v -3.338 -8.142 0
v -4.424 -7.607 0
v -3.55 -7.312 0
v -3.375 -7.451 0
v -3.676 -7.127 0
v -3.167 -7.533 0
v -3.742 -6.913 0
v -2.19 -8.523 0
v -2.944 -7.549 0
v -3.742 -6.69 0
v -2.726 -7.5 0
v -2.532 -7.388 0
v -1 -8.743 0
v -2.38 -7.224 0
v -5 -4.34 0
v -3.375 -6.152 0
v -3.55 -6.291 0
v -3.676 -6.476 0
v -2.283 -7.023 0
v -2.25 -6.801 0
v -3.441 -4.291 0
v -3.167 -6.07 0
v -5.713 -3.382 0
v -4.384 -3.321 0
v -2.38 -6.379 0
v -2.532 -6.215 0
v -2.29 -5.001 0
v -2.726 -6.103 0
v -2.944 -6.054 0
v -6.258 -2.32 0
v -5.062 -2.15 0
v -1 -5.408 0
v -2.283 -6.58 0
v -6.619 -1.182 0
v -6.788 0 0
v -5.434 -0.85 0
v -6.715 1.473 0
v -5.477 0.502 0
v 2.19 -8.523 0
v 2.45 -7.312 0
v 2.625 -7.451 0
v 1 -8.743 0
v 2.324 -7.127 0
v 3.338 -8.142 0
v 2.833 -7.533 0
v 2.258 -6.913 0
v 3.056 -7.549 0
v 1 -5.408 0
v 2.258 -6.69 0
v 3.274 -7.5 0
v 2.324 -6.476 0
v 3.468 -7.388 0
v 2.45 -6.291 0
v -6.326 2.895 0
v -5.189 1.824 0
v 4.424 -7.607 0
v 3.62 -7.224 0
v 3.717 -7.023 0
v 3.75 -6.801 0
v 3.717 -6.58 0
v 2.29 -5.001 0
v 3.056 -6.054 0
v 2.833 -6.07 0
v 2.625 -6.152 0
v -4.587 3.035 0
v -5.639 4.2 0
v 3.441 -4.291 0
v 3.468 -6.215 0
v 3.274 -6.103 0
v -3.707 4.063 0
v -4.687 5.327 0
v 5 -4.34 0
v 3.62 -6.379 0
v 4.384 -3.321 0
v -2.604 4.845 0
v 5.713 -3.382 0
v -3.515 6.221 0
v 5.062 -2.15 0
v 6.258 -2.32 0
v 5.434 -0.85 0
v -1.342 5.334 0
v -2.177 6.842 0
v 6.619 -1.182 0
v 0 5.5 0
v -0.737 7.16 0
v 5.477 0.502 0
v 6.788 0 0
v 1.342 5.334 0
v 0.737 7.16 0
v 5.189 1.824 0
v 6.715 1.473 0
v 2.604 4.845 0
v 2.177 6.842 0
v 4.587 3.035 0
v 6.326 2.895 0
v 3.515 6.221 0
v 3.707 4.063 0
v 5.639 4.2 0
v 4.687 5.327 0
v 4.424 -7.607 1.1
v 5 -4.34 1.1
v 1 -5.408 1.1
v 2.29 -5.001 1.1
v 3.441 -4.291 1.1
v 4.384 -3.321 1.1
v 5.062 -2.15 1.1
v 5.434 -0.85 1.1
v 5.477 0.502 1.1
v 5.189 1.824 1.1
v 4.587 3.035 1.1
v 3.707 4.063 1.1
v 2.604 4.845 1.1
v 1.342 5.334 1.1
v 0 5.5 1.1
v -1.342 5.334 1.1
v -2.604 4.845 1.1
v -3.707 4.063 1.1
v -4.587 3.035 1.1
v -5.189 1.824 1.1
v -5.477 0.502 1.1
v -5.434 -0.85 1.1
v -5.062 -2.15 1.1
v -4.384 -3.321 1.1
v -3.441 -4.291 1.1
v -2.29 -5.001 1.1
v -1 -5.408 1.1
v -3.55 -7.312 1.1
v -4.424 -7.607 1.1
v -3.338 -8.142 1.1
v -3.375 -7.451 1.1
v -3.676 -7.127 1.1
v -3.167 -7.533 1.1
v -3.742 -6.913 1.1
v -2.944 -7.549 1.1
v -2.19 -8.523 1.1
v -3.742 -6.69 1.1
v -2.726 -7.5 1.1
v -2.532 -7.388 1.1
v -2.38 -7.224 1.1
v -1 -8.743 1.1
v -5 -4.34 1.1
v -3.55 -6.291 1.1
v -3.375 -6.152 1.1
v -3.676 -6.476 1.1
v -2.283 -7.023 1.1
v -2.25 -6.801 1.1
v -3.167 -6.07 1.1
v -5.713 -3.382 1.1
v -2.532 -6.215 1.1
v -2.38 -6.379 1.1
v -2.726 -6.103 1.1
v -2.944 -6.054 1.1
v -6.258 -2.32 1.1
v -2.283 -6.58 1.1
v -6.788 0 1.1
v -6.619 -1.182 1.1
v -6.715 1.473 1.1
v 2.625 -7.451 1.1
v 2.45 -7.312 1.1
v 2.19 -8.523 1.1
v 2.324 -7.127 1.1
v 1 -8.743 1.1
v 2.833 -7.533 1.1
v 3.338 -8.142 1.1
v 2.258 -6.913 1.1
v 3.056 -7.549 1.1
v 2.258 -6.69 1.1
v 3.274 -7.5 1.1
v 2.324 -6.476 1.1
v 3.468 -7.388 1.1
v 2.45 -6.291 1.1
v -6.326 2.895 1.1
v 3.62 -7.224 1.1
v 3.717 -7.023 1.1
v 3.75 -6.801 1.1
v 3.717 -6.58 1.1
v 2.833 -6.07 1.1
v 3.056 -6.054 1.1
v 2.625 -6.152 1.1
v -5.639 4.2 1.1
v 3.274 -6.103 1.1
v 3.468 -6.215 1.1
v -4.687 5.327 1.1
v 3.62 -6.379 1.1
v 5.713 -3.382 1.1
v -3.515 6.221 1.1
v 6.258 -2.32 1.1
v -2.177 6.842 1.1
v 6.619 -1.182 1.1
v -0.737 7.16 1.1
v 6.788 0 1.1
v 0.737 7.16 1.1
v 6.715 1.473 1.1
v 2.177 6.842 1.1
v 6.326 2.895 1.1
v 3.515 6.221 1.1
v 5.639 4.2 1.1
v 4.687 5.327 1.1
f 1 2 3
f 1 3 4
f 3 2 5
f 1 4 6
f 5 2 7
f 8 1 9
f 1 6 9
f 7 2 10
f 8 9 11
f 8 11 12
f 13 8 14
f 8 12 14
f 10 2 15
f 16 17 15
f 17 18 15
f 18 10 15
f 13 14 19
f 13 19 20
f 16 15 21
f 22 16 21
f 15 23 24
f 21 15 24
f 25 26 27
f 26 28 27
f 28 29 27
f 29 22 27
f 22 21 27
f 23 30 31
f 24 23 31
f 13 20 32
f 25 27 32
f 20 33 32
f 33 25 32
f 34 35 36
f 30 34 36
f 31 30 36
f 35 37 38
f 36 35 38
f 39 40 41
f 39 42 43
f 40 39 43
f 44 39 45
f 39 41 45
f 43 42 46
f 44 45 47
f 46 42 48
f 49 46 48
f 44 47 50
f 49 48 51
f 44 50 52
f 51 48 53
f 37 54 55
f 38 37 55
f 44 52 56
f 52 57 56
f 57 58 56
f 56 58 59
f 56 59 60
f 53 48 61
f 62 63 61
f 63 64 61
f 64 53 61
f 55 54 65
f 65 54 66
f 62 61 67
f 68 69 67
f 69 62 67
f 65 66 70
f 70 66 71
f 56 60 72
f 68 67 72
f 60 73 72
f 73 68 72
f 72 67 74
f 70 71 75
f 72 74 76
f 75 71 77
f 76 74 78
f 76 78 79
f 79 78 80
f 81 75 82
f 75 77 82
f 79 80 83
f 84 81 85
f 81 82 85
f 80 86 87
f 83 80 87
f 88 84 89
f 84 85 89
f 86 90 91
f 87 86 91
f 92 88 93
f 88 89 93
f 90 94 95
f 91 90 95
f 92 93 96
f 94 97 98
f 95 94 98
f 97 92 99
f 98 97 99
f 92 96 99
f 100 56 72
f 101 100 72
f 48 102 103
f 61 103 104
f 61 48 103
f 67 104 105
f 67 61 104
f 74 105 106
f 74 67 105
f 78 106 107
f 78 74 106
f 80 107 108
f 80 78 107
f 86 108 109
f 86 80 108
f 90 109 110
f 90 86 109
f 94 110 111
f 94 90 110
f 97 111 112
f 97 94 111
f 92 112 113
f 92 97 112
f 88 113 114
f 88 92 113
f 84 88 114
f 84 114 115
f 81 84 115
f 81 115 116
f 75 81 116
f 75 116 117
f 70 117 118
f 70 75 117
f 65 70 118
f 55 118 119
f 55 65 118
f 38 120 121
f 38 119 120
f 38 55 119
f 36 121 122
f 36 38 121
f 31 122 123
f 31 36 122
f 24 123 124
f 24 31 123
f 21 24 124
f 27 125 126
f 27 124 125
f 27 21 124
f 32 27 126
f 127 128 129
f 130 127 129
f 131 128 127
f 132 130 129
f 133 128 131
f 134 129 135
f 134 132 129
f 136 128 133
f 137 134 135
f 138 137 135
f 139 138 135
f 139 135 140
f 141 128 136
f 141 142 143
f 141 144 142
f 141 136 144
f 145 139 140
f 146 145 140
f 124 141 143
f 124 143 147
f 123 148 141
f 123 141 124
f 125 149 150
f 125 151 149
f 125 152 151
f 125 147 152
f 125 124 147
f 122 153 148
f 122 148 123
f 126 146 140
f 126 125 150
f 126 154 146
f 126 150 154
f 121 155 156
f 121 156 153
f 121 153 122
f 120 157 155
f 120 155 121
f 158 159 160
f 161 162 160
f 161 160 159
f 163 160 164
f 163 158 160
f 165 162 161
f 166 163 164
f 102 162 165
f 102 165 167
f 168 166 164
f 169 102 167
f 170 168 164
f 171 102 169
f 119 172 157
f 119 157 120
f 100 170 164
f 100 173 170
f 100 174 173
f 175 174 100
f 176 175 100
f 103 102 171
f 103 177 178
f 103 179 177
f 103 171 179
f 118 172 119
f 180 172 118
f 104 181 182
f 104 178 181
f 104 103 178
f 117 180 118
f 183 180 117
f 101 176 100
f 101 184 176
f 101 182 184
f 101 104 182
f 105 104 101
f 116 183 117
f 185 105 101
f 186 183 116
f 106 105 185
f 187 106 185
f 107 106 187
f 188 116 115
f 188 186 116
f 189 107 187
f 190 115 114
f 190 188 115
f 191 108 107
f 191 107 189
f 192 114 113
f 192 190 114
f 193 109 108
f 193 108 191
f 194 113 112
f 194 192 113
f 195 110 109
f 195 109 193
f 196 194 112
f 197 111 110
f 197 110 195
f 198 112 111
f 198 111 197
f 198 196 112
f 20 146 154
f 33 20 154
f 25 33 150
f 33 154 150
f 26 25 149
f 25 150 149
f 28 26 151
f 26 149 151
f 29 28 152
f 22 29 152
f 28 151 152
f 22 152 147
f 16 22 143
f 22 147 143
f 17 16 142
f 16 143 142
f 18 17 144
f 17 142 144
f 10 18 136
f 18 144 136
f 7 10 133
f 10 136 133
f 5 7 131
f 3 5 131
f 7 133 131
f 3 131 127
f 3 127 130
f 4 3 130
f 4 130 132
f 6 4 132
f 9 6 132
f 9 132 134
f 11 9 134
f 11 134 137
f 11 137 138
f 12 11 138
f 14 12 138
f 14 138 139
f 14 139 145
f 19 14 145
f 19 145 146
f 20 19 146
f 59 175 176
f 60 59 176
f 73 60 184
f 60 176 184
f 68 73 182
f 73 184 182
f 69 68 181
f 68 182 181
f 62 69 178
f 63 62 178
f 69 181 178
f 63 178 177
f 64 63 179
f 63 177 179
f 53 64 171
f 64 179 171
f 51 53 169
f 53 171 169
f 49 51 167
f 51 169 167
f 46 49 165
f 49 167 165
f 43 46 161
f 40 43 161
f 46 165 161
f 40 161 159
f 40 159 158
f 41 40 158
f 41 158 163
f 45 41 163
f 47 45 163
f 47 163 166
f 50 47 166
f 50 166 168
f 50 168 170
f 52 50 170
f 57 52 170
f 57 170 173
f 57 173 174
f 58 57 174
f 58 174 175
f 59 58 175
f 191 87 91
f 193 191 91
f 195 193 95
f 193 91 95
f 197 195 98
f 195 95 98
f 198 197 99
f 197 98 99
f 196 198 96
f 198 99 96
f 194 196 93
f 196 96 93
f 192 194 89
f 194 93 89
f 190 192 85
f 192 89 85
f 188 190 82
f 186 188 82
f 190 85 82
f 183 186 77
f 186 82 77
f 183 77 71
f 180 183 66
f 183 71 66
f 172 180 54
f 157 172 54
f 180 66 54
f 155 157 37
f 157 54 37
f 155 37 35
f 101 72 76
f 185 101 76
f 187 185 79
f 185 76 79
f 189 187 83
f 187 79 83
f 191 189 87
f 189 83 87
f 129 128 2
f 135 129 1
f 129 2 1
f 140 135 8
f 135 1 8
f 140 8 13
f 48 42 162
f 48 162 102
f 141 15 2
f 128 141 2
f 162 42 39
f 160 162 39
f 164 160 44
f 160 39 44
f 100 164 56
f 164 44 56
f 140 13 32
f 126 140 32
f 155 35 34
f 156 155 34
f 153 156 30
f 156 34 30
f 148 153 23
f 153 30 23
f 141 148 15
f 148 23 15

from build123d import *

# Parameters (mm, degrees)
SKETCH_1_R               = 5.5
EXTRUDE_1_DEPTH          = 1.1
CUT_EXTRUDE_1_DEPTH      = 12.175419455
CUT_EXTRUDE_1_DEPTH_BACK = 1.1
SKETCH_2_W               = 2
SKETCH_2_H               = 8.74586507
SKETCH_3_R               = 0.75
CUT_EXTRUDE_1_2_DEPTH    = 12.130588484


with BuildPart() as part:
    # 草图1 → 凸台-拉伸1 (new body)
    with BuildSketch(Plane.XY):
        with BuildLine():
            Line((-5, -4.339608214), (-4.423832973, -7.607213802))
            ThreePointArc((-4.423832973, -7.607213802), (0, -8.8), (4.423832973, -7.607213802))
            Line((4.423832973, -7.607213802), (5, -4.339608214))
            ThreePointArc((5, -4.339608214), (6.257657716, -2.319610394), (6.788225099, 0))
            ThreePointArc((6.788225099, 0), (0, 7.2), (-6.788225099, 0))
            ThreePointArc((-6.788225099, 0), (-6.257657716, -2.319610394), (-5, -4.339608214))
        make_face()
        Circle(SKETCH_1_R, mode=Mode.SUBTRACT)
    extrude(amount=EXTRUDE_1_DEPTH)

    # 草图2 → Cut-Extrude 1 (cut, two sides: drawn at the far end of the back side and taken through both)
    with BuildSketch(Plane.XY.offset(1.1).offset(-CUT_EXTRUDE_1_DEPTH_BACK)):
        with Locations((0, -8.997615825)):
            Rectangle(SKETCH_2_W, SKETCH_2_H)
    extrude(amount=CUT_EXTRUDE_1_DEPTH + CUT_EXTRUDE_1_DEPTH_BACK, mode=Mode.SUBTRACT)

    # 草图3 → Cut-Extrude 1 2 (cut, through all)
    with BuildSketch(Plane.XY.offset(1.1)):
        with Locations((3, -6.801492871)):
            Circle(SKETCH_3_R)
        with Locations((-3, -6.801492871)):
            Circle(SKETCH_3_R)
    extrude(amount=-CUT_EXTRUDE_1_2_DEPTH, mode=Mode.SUBTRACT)


solid = part.part
